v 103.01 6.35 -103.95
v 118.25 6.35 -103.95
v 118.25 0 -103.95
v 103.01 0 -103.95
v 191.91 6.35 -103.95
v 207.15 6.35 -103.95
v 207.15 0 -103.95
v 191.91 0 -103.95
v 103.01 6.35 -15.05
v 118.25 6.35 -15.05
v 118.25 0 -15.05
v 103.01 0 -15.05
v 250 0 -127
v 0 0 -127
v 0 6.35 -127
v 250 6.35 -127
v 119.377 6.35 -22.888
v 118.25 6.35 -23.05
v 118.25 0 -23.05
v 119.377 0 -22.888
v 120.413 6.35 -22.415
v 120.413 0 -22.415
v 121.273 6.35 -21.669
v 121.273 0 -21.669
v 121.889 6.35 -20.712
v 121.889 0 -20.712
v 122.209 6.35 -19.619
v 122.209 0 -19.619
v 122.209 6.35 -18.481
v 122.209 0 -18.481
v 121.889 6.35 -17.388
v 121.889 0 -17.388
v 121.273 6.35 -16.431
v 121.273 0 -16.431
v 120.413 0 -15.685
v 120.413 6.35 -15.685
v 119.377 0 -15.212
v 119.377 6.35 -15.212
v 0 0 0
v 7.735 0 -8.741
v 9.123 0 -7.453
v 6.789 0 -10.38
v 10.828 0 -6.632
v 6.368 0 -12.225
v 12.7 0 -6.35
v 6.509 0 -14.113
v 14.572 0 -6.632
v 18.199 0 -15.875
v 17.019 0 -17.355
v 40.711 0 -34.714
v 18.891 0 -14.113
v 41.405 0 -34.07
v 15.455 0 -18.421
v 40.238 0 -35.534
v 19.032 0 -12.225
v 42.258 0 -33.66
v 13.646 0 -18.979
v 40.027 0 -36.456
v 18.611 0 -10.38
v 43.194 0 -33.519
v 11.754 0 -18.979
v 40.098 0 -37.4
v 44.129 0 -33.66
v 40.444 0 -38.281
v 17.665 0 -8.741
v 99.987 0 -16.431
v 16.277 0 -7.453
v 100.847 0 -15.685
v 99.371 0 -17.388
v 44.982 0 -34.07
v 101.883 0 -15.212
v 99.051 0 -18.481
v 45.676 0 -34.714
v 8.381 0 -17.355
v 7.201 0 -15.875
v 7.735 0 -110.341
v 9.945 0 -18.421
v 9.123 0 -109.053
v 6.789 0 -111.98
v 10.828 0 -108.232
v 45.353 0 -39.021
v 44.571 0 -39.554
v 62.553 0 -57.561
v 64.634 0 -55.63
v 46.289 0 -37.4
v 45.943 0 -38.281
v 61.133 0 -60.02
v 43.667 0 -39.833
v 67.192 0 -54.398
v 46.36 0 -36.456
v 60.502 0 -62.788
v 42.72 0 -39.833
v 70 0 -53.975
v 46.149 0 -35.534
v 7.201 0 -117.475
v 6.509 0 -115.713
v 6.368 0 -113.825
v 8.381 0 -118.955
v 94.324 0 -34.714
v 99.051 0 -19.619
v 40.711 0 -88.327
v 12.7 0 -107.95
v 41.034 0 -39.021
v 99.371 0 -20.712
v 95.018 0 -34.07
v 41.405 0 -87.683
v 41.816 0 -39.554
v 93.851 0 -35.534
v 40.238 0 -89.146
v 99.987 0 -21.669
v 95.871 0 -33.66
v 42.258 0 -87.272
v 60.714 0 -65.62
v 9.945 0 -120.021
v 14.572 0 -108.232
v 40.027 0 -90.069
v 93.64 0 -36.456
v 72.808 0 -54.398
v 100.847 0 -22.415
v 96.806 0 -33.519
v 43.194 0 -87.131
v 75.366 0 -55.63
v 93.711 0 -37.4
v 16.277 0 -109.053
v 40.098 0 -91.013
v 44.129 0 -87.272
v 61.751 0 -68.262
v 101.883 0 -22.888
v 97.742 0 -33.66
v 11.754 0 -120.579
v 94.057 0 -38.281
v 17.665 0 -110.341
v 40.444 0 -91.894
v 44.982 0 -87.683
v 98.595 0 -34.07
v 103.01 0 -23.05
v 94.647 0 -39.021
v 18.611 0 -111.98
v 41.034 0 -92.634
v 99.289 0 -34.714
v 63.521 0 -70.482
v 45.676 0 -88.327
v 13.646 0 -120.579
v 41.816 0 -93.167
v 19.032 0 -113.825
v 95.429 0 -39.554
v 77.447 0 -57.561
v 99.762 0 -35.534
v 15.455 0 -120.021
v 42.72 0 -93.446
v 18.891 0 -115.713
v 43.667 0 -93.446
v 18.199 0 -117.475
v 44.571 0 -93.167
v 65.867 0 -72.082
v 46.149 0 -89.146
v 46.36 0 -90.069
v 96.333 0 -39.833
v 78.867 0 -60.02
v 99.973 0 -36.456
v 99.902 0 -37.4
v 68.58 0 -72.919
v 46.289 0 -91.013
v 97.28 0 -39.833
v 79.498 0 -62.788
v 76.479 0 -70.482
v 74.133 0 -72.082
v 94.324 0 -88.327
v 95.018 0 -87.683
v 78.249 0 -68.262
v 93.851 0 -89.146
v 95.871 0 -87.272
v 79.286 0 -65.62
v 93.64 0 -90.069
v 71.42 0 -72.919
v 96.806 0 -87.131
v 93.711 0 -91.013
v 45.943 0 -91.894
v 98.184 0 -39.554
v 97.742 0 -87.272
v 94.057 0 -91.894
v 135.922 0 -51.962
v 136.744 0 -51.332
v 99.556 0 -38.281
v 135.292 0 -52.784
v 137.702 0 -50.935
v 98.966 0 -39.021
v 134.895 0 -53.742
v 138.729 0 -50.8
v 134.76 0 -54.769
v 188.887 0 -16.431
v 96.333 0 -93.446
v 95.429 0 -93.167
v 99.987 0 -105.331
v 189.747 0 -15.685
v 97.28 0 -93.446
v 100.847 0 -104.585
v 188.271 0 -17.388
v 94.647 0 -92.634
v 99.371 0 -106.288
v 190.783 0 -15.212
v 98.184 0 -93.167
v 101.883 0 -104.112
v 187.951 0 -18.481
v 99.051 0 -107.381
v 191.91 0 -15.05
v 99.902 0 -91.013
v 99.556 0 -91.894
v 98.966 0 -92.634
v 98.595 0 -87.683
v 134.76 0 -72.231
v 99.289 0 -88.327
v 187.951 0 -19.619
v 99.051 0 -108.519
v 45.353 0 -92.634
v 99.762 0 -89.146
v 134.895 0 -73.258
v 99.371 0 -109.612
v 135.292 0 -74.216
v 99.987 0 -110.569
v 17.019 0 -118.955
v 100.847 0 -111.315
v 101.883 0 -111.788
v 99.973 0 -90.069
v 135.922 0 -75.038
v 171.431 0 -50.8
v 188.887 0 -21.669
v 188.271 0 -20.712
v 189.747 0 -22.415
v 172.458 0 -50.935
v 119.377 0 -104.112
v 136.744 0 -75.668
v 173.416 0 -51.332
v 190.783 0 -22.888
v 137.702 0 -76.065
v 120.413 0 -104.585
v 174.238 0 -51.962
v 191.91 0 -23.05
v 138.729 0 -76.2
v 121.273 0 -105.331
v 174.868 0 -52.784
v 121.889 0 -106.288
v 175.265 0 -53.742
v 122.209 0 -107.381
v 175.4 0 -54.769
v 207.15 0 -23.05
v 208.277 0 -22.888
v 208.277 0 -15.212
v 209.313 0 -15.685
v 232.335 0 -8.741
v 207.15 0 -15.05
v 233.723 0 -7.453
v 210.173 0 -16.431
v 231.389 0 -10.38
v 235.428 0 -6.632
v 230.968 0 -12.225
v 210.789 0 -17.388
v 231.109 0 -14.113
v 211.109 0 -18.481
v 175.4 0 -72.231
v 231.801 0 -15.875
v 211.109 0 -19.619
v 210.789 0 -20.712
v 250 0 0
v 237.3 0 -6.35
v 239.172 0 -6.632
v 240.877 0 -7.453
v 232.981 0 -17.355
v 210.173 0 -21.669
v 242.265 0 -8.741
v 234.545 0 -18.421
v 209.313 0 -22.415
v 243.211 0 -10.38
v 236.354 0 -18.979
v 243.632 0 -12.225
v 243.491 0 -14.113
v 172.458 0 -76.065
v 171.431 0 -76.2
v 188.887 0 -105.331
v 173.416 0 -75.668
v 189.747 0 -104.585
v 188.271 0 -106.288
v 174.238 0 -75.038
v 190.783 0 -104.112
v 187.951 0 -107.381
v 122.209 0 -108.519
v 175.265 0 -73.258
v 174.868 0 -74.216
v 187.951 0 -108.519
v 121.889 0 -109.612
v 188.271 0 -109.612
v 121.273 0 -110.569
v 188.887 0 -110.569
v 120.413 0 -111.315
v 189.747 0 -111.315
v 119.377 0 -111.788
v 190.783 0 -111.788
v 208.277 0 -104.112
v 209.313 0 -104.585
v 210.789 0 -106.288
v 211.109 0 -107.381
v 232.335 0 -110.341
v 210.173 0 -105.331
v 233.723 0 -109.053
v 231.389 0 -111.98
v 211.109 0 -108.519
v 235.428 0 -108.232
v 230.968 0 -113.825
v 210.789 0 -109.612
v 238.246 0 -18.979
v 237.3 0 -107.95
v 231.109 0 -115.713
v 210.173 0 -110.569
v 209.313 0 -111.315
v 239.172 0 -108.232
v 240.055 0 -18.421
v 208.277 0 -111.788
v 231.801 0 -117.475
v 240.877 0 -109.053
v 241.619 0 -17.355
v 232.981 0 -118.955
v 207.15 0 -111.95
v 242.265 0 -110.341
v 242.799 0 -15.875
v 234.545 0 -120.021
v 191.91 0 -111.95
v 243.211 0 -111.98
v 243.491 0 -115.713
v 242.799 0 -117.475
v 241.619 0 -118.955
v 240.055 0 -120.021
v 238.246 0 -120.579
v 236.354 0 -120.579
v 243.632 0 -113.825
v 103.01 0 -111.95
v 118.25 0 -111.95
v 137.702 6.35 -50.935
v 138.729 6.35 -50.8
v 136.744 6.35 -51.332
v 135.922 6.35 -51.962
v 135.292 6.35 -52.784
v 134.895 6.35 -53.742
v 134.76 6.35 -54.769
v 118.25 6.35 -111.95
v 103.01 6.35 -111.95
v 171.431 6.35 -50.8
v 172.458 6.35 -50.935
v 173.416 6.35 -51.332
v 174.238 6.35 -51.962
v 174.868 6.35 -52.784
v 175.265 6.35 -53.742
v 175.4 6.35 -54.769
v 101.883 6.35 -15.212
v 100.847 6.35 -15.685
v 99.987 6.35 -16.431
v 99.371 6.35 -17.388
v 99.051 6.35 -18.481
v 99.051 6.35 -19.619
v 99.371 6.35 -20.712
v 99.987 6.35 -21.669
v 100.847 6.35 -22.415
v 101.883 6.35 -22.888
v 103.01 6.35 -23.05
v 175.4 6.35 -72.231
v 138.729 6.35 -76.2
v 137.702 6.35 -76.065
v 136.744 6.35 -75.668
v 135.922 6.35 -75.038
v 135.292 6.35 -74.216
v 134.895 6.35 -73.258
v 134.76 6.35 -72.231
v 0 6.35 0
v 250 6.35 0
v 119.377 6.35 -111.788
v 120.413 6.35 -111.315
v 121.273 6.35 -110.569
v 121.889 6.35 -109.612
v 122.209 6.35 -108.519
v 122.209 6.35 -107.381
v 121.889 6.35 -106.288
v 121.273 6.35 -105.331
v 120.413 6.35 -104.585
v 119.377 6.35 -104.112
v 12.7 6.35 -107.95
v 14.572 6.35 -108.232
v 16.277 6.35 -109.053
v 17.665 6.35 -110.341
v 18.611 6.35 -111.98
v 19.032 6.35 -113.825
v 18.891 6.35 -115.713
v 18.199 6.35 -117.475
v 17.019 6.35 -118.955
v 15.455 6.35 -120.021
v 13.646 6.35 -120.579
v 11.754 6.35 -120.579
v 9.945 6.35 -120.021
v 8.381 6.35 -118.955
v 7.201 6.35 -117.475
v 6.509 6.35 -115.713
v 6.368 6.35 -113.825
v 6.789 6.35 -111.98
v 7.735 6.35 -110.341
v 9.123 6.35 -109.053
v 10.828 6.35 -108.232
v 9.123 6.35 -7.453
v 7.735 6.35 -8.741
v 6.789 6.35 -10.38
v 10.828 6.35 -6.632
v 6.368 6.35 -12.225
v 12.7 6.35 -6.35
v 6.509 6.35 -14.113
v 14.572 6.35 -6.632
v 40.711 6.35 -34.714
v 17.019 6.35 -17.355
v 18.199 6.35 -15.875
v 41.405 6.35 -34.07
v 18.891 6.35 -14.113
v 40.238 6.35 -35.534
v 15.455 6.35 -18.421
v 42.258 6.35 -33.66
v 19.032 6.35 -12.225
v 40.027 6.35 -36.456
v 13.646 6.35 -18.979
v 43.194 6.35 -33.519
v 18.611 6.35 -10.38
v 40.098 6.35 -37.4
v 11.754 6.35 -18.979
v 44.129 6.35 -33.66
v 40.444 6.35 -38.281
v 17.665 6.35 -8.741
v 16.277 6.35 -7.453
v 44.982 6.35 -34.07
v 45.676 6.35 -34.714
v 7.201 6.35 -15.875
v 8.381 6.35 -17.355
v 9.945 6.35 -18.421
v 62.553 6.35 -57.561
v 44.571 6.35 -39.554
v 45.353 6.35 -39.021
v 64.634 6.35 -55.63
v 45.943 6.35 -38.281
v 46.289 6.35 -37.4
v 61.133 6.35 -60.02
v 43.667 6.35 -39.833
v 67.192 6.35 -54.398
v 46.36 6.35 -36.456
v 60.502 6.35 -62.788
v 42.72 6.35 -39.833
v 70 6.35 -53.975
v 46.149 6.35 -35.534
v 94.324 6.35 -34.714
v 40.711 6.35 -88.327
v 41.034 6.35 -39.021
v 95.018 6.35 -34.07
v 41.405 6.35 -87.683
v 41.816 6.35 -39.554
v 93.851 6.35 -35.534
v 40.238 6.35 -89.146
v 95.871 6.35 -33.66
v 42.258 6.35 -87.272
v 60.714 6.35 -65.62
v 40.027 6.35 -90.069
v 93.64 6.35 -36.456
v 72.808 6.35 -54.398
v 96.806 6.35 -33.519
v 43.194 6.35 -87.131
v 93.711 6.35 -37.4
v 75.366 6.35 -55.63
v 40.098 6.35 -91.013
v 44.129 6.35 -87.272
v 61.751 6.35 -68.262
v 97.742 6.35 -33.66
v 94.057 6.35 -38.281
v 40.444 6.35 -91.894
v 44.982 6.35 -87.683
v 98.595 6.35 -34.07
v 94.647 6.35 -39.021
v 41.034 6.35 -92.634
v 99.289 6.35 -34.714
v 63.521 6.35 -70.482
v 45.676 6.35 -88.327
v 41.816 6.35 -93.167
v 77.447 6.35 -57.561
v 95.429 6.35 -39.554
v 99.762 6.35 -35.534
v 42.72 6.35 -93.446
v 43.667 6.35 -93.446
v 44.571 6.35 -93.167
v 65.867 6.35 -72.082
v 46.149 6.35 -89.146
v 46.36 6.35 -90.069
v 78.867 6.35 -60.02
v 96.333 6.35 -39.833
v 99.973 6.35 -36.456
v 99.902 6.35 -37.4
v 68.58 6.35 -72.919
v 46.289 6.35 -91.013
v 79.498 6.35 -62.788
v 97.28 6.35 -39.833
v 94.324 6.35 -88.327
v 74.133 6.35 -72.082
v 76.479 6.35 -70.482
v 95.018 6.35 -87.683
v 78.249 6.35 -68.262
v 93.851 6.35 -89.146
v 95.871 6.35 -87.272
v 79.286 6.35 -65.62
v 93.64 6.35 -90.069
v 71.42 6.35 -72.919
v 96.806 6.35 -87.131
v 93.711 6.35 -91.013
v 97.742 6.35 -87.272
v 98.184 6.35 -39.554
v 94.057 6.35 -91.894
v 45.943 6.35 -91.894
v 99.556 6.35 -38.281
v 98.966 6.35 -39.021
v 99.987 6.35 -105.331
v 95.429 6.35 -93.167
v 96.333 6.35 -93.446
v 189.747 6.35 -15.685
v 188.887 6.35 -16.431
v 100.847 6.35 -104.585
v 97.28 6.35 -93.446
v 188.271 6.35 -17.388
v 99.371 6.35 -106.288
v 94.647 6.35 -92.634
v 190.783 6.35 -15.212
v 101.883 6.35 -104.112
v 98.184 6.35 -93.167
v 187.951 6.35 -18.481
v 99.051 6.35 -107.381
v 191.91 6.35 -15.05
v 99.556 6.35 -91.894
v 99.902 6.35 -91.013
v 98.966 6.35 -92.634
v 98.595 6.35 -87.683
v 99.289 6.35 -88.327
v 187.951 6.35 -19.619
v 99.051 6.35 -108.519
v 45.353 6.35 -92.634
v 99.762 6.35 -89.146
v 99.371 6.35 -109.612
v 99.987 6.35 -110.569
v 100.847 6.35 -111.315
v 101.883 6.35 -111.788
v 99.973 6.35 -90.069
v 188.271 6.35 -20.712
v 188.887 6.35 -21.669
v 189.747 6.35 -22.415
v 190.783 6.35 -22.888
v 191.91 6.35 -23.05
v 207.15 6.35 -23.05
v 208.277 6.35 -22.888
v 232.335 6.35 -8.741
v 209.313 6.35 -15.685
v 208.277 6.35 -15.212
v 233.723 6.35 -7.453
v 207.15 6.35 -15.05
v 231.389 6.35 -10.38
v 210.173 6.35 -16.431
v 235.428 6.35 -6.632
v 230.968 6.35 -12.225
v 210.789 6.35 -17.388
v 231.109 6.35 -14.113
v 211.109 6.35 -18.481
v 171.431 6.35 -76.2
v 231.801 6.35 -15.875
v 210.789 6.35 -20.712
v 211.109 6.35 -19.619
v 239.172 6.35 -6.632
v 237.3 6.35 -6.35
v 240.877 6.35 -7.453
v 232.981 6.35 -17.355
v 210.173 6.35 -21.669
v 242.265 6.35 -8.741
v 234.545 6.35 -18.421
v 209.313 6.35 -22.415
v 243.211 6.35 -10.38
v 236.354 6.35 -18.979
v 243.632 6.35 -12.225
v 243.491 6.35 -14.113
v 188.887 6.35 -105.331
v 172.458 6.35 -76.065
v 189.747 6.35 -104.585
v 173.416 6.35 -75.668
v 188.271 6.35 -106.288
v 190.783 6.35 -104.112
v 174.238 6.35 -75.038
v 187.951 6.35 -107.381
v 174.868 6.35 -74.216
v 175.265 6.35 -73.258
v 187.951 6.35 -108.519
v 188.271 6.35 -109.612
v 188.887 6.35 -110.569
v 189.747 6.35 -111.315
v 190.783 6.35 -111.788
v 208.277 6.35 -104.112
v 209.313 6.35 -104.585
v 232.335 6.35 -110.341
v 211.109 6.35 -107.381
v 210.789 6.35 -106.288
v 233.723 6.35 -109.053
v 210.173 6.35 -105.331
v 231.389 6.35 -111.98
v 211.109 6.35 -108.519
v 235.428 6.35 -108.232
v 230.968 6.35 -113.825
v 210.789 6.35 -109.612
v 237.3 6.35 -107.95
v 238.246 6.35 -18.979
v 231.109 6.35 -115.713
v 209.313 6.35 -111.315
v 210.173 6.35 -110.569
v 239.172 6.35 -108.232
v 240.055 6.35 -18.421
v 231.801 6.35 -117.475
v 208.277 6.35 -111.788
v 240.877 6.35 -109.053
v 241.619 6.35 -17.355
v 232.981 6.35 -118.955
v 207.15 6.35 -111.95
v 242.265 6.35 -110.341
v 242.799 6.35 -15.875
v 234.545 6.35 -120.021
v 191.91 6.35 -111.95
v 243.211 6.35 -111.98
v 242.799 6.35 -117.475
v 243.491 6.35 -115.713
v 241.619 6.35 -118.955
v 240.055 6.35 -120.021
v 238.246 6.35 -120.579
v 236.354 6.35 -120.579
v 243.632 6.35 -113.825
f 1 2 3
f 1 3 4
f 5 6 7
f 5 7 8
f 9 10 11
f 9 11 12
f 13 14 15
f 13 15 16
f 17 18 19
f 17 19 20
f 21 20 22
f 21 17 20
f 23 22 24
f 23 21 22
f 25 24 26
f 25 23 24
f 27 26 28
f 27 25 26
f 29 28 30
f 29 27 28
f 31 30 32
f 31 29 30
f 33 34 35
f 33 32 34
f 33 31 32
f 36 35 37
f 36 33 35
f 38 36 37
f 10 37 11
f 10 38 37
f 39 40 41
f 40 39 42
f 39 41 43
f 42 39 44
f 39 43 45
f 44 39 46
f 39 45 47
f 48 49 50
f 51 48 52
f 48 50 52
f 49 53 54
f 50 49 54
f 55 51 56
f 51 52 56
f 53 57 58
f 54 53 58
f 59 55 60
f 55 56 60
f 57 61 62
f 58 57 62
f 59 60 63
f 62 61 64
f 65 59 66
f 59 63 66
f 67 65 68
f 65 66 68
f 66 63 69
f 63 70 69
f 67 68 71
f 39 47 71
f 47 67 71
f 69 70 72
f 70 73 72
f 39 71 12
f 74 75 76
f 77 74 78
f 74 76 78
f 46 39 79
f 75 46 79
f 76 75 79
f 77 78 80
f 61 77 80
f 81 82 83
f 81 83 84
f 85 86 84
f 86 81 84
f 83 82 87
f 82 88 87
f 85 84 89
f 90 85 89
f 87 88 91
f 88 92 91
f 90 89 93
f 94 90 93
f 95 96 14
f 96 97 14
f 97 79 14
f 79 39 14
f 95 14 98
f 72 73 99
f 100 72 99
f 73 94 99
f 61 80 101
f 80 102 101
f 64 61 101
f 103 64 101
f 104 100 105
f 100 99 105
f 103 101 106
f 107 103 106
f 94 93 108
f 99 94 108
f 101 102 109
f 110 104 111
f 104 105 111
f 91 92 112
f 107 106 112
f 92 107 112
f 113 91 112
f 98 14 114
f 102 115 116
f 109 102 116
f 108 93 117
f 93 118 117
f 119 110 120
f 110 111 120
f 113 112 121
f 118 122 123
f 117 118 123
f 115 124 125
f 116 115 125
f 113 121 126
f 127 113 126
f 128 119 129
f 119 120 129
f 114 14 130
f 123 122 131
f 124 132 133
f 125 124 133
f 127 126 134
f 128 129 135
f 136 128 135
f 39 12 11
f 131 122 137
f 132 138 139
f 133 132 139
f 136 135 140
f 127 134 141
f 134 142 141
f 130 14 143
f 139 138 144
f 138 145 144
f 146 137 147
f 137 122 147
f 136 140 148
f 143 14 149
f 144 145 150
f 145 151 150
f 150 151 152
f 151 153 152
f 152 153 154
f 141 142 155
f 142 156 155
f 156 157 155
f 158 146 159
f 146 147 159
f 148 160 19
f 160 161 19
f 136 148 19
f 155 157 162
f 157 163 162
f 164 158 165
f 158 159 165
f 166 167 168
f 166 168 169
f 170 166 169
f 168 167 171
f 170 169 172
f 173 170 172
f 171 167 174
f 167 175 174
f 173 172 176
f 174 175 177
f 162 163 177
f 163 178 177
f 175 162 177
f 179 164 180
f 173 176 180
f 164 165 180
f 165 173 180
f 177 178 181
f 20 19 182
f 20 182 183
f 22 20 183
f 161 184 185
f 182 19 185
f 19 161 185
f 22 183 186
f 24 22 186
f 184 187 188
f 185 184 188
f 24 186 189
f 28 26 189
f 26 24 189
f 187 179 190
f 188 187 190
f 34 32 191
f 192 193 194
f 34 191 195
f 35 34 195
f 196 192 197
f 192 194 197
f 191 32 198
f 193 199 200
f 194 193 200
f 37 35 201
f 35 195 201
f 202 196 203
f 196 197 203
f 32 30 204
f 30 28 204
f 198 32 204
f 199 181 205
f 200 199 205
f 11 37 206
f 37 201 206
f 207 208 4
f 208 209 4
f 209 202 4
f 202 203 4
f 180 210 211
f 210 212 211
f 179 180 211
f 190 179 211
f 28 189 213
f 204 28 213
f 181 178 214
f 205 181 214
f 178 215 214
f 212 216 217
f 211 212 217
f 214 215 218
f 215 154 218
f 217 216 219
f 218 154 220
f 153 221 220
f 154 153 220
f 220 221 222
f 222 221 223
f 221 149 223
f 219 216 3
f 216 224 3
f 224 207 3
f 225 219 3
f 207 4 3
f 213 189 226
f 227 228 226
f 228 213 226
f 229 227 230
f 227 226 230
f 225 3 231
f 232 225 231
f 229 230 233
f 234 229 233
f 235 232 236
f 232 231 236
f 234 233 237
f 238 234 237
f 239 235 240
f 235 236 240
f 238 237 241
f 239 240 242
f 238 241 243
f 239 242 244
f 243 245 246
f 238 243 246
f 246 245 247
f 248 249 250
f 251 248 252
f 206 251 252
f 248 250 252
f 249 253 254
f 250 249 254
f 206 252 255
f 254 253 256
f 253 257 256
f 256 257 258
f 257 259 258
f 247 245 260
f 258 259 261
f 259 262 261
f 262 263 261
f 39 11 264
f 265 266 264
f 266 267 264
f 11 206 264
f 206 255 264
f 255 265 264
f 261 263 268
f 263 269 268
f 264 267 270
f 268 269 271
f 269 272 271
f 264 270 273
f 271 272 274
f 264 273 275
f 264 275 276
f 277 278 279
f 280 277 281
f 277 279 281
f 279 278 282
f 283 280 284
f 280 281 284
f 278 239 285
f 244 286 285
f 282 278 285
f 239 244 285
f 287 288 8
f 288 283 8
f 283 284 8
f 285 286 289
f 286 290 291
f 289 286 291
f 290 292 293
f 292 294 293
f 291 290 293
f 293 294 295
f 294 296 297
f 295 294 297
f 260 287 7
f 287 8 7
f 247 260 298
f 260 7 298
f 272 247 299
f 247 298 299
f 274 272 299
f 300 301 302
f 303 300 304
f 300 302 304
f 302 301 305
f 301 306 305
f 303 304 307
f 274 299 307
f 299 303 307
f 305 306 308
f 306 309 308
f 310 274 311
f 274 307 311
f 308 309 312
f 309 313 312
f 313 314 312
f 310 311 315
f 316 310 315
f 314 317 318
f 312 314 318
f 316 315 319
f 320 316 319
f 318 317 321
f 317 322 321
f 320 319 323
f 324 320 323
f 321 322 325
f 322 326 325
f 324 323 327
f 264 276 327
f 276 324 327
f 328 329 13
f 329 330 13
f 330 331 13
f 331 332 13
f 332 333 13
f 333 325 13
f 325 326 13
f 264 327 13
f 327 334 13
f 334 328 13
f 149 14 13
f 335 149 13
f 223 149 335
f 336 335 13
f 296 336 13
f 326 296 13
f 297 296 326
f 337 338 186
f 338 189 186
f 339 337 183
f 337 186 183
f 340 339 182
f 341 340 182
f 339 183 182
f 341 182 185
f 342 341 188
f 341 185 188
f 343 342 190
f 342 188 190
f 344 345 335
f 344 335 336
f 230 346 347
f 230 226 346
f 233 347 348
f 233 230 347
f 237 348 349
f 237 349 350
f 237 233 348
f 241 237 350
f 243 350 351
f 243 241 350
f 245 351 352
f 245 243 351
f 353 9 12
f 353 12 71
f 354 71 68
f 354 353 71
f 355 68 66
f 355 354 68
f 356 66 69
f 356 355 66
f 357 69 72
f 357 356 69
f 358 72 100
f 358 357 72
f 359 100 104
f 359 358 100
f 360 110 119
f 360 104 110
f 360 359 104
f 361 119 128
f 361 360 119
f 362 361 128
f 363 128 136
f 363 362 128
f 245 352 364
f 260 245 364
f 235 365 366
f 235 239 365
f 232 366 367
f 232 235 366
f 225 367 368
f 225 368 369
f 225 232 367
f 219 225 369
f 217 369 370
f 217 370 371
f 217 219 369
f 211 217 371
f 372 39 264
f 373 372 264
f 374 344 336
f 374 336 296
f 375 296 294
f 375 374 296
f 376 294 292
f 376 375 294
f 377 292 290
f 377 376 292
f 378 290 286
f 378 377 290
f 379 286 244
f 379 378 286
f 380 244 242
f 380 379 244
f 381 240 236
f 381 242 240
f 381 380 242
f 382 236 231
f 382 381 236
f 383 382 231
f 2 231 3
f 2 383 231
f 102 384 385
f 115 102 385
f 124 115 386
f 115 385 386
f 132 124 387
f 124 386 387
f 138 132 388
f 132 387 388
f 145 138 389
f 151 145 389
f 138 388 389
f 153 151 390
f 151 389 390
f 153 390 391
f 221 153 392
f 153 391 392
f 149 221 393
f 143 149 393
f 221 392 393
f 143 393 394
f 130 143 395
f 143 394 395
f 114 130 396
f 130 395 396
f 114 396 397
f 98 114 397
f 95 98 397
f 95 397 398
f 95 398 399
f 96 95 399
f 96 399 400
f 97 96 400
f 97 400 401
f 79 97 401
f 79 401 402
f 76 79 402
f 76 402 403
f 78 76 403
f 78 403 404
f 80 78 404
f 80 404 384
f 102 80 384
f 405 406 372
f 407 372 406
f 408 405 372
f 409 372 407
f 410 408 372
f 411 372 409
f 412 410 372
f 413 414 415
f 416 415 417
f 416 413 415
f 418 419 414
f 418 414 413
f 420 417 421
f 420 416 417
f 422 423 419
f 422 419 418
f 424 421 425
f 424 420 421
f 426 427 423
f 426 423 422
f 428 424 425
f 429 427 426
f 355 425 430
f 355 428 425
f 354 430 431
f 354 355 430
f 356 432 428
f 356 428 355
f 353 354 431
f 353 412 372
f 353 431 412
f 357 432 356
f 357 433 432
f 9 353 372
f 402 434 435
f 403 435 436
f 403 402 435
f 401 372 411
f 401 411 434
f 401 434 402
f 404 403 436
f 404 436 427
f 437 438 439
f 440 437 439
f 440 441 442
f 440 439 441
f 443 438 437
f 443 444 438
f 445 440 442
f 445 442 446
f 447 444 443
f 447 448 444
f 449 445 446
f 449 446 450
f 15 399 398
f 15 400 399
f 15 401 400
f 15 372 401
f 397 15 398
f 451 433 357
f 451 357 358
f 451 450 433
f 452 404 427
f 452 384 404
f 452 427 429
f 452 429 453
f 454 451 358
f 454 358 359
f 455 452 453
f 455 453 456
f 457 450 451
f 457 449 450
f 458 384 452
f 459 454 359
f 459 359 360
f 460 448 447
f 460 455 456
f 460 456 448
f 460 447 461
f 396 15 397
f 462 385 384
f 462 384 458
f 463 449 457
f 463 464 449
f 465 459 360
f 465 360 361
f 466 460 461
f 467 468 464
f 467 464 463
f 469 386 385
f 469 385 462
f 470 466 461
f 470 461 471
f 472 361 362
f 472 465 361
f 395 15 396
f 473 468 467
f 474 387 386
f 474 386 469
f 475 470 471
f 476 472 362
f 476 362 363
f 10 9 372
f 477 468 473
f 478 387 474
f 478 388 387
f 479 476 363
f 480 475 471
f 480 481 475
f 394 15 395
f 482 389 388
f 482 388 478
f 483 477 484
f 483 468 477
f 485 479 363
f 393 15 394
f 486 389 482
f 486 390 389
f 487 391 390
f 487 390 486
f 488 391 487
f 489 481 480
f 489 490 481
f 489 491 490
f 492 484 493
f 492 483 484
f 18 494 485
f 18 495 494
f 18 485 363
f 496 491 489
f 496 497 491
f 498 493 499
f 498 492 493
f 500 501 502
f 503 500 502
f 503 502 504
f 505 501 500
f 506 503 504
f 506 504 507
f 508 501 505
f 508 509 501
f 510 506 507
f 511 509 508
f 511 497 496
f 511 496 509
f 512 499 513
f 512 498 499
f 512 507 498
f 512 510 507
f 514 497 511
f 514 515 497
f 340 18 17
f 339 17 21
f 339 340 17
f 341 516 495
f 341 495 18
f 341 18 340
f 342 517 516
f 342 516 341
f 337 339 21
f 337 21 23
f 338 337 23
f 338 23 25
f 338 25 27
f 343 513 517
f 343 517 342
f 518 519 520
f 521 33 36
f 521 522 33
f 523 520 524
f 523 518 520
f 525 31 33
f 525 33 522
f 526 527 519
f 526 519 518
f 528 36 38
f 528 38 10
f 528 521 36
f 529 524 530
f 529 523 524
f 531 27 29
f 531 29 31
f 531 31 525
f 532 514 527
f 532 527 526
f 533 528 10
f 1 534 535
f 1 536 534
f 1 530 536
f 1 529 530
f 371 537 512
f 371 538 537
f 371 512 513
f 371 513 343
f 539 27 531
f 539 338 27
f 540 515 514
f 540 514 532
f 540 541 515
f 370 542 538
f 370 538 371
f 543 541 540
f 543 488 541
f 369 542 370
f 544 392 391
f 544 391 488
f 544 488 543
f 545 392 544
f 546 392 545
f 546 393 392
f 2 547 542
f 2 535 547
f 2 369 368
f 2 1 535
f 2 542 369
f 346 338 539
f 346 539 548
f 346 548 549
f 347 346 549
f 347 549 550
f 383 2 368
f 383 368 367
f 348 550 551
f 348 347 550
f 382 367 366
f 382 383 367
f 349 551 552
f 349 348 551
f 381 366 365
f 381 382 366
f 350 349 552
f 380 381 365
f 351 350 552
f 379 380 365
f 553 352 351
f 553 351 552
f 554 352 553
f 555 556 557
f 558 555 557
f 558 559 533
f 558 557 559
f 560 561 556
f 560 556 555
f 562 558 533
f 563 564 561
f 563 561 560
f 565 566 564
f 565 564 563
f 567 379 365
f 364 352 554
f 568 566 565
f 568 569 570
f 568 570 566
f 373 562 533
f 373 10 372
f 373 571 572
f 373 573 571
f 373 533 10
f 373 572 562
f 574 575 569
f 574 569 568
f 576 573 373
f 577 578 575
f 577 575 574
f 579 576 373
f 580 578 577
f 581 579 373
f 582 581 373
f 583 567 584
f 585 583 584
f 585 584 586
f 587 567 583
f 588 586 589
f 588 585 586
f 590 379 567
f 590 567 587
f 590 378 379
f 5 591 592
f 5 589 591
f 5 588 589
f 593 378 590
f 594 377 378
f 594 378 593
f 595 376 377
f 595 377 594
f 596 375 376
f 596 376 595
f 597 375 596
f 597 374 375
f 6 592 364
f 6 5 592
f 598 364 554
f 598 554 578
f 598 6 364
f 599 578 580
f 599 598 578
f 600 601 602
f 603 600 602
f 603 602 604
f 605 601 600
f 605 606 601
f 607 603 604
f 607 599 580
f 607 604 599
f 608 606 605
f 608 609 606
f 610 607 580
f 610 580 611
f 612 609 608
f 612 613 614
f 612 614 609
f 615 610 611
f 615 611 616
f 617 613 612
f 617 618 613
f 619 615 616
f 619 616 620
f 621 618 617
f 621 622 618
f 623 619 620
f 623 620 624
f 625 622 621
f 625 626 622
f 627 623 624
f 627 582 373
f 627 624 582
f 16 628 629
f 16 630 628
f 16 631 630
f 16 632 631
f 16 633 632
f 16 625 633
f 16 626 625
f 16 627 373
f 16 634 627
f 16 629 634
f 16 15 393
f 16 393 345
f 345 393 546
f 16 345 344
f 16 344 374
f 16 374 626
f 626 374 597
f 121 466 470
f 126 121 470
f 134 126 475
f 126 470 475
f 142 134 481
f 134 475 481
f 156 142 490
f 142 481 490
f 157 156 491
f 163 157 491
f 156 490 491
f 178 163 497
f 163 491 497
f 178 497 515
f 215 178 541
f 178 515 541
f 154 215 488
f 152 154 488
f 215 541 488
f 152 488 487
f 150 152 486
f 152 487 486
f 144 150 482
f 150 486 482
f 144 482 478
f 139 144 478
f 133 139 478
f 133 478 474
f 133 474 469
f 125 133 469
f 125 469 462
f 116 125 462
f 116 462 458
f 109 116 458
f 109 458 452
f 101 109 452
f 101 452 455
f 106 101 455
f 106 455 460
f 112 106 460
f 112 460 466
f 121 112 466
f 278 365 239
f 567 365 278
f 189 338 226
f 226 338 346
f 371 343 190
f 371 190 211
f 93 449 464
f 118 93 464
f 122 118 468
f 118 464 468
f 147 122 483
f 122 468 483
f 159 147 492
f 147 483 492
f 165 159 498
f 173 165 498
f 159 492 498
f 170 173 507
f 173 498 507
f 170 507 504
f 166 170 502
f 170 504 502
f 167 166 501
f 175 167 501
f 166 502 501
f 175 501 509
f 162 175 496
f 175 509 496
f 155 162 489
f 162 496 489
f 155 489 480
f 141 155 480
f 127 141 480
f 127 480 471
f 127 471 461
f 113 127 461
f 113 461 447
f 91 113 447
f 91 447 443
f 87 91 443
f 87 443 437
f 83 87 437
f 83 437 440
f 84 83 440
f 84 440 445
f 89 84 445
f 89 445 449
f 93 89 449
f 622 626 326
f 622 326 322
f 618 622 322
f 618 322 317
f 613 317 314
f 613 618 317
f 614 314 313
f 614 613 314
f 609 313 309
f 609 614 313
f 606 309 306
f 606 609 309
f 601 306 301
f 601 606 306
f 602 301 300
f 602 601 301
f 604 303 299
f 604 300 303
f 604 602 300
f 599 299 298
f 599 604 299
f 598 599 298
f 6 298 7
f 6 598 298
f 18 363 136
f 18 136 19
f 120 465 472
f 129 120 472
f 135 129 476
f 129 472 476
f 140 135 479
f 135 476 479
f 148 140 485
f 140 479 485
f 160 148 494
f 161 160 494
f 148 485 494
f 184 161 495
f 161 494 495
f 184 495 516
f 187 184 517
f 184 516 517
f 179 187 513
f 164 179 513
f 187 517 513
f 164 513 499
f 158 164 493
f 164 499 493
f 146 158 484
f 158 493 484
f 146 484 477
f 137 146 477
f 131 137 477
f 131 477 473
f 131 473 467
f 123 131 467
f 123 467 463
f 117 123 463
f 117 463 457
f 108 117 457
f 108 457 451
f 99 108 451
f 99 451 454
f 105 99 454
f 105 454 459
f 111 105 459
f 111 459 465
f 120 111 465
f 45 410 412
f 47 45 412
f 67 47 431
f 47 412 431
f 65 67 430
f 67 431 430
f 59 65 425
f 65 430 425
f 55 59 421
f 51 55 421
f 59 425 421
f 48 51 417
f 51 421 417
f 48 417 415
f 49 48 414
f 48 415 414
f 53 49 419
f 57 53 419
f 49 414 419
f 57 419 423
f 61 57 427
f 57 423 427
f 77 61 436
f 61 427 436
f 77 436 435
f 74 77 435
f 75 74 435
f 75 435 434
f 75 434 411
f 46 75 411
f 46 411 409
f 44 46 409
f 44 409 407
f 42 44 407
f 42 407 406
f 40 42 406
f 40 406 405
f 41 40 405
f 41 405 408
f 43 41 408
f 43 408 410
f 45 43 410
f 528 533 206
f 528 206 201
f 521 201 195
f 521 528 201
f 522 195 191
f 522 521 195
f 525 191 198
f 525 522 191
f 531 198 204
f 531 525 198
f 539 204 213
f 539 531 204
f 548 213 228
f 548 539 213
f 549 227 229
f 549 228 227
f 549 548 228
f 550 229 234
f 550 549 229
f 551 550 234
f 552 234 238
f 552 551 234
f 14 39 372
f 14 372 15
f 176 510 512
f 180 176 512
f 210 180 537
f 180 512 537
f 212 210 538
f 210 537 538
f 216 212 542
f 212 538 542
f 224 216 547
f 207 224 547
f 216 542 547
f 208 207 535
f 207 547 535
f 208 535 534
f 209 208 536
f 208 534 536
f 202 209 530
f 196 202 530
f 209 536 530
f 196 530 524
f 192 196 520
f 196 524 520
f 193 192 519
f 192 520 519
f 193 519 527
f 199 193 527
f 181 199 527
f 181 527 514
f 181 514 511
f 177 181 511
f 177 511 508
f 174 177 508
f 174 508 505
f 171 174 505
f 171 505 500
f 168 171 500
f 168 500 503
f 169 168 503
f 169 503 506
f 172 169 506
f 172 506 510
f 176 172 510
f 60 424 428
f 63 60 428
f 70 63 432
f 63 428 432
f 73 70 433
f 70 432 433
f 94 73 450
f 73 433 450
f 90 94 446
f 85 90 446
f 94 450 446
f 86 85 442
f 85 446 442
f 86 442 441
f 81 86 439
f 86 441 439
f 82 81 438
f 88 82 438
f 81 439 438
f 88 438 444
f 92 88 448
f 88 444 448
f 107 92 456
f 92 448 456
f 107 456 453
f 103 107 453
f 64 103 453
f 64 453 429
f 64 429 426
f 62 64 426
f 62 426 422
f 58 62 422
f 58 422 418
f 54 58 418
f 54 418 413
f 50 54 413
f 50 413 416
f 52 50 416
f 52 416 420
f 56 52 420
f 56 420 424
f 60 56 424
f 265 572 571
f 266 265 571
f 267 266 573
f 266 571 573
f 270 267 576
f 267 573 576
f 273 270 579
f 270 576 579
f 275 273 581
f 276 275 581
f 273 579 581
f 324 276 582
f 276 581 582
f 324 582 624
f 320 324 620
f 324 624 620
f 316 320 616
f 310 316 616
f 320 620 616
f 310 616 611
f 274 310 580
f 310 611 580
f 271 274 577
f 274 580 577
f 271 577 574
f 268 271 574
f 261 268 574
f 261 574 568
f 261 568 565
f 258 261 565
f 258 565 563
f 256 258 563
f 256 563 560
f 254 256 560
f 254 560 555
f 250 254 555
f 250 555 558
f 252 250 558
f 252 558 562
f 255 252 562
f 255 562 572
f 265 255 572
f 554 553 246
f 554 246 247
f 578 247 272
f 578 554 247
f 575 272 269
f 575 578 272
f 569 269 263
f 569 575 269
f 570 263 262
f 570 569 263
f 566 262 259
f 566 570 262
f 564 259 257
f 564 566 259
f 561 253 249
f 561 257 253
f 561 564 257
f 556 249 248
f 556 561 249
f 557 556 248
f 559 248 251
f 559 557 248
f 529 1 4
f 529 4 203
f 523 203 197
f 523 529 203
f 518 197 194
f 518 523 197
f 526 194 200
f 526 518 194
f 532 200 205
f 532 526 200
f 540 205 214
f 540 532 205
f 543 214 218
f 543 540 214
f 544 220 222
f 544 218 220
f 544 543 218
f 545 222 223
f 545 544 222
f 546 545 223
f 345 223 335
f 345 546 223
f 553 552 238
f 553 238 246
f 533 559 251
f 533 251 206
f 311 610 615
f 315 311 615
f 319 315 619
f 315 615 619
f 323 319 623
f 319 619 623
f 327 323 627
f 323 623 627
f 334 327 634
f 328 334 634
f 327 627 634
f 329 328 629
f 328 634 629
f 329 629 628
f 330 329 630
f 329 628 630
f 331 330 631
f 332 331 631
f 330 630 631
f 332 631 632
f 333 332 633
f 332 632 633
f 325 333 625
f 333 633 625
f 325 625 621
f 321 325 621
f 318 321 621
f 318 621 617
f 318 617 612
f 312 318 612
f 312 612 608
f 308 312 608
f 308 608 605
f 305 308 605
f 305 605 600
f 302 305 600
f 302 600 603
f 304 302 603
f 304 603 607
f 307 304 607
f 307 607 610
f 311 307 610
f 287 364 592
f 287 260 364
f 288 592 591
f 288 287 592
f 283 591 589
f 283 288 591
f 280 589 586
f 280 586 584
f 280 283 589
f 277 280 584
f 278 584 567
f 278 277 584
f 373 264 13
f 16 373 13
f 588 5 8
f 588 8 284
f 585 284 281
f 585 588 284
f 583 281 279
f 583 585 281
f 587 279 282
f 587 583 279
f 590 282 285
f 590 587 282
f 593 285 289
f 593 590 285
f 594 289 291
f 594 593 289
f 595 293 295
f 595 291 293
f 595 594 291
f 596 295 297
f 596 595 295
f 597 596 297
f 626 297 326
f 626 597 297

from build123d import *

# Parameters (mm, degrees)
SKETCH1_W           = 250
SKETCH1_H           = 127
BOSS_EXTRUDE1_DEPTH = 6.35
SKETCH2_R           = 6.35
SKETCH2_R_2         = 3.175
SKETCH2_R_3         = 9.525
SKETCH2_R_4         = 4
SKETCH2_R_5         = 12.5
CUT_EXTRUDE1_DEPTH  = 281.480520714
CUT_EXTRUDE2_DEPTH  = 281.480520714
SKETCH9_W           = 40.64
SKETCH9_H           = 25.4
CUT_EXTRUDE3_DEPTH  = 281.480520714
FILLET1_R           = 3.96875


with BuildPart() as part:
    # Sketch1 → Boss-Extrude1 (new body)
    with BuildSketch(Plane(origin=(0, 0, 0), x_dir=(1, 0, 0), z_dir=(0, 1, 0))):
        with Locations((125, 63.5)):
            Rectangle(SKETCH1_W, SKETCH1_H)
    extrude(amount=BOSS_EXTRUDE1_DEPTH)

    # Sketch2 → Cut-Extrude1 (cut, through all)
    with BuildSketch(Plane(origin=(0, 6.35, 0), x_dir=(1, 0, 0), z_dir=(0, 1, 0))):
        with Locations(Location((237.3, 12.7, 0), (0, 0, 270))):
            Circle(SKETCH2_R)
        with Locations(Location((237.3, 114.3, 0), (0, 0, 270))):
            Circle(SKETCH2_R)
        with Locations(Location((12.7, 12.7, 0), (0, 0, 270))):
            Circle(SKETCH2_R)
        with Locations(Location((12.7, 114.3, 0), (0, 0, 270))):
            Circle(SKETCH2_R)
        with Locations(Location((43.193581925, 36.693581925, 0), (0, 0, 270))):
            Circle(SKETCH2_R_2)
        with Locations(Location((96.806418075, 36.693581925, 0), (0, 0, 270))):
            Circle(SKETCH2_R_2)
        with Locations(Location((96.806418075, 90.306418075, 0), (0, 0, 270))):
            Circle(SKETCH2_R_2)
        with Locations(Location((43.193581925, 90.306418075, 0), (0, 0, 270))):
            Circle(SKETCH2_R_2)
        with Locations(Location((70, 63.5, 0), (0, 0, 270))):
            Circle(SKETCH2_R_3)
        with Locations(Location((105.55, 19.05, 0), (0, 0, 270))):
            Circle(SKETCH2_R_4)
        with Locations(Location((194.45, 19.05, 0), (0, 0, 270))):
            Circle(SKETCH2_R_4)
        with Locations(Location((194.45, 107.95, 0), (0, 0, 270))):
            Circle(SKETCH2_R_4)
        with Locations(Location((105.55, 107.95, 0), (0, 0, 270))):
            Circle(SKETCH2_R_4)
        with Locations(Location((150, 63.5, 0), (0, 0, 270))):
            Circle(SKETCH2_R_5)
    extrude(amount=-CUT_EXTRUDE1_DEPTH, mode=Mode.SUBTRACT)

    # Sketch8 → Cut-Extrude2 (cut, through all)
    with BuildSketch(Plane(origin=(0, 6.35, 0), x_dir=(1, 0, 0), z_dir=(0, 1, 0))):
        with BuildLine():
            Line((103.01, 111.95), (118.25, 111.95))
            ThreePointArc((118.25, 111.95), (122.25, 107.95), (118.25, 103.95))
            Line((118.25, 103.95), (103.01, 103.95))
            ThreePointArc((103.01, 103.95), (99.01, 107.95), (103.01, 111.95))
        make_face()
        with BuildLine():
            Line((191.91, 111.95), (207.15, 111.95))
            ThreePointArc((207.15, 111.95), (211.15, 107.95), (207.15, 103.95))
            Line((207.15, 103.95), (191.91, 103.95))
            ThreePointArc((191.91, 103.95), (187.91, 107.95), (191.91, 111.95))
        make_face()
        with BuildLine():
            Line((103.01, 23.05), (118.25, 23.05))
            ThreePointArc((118.25, 23.05), (122.25, 19.05), (118.25, 15.05))
            Line((118.25, 15.05), (103.01, 15.05))
            ThreePointArc((103.01, 15.05), (99.01, 19.05), (103.01, 23.05))
        make_face()
        with BuildLine():
            Line((191.91, 23.05), (207.15, 23.05))
            ThreePointArc((207.15, 23.05), (211.15, 19.05), (207.15, 15.05))
            Line((207.15, 15.05), (191.91, 15.05))
            ThreePointArc((191.91, 15.05), (187.91, 19.05), (191.91, 23.05))
        make_face()
    extrude(amount=-CUT_EXTRUDE2_DEPTH, mode=Mode.SUBTRACT)

    # Sketch9 → Cut-Extrude3 (cut, through all)
    with BuildSketch(Plane(origin=(0, 6.35, 0), x_dir=(1, 0, 0), z_dir=(0, 1, 0))):
        with Locations((155.08, 63.5)):
            Rectangle(SKETCH9_W, SKETCH9_H)
    extrude(amount=-CUT_EXTRUDE3_DEPTH, mode=Mode.SUBTRACT)

    # Fillet1
    fillet1_edges = [part.edges().sort_by_distance(p)[0] for p in [
        (134.76, 3.175, -50.8),
        (134.76, 3.175, -76.2),
        (175.4, 3.175, -76.2),
        (175.4, 3.175, -50.8),
    ]]
    fillet(fillet1_edges, radius=FILLET1_R)


solid = part.part
